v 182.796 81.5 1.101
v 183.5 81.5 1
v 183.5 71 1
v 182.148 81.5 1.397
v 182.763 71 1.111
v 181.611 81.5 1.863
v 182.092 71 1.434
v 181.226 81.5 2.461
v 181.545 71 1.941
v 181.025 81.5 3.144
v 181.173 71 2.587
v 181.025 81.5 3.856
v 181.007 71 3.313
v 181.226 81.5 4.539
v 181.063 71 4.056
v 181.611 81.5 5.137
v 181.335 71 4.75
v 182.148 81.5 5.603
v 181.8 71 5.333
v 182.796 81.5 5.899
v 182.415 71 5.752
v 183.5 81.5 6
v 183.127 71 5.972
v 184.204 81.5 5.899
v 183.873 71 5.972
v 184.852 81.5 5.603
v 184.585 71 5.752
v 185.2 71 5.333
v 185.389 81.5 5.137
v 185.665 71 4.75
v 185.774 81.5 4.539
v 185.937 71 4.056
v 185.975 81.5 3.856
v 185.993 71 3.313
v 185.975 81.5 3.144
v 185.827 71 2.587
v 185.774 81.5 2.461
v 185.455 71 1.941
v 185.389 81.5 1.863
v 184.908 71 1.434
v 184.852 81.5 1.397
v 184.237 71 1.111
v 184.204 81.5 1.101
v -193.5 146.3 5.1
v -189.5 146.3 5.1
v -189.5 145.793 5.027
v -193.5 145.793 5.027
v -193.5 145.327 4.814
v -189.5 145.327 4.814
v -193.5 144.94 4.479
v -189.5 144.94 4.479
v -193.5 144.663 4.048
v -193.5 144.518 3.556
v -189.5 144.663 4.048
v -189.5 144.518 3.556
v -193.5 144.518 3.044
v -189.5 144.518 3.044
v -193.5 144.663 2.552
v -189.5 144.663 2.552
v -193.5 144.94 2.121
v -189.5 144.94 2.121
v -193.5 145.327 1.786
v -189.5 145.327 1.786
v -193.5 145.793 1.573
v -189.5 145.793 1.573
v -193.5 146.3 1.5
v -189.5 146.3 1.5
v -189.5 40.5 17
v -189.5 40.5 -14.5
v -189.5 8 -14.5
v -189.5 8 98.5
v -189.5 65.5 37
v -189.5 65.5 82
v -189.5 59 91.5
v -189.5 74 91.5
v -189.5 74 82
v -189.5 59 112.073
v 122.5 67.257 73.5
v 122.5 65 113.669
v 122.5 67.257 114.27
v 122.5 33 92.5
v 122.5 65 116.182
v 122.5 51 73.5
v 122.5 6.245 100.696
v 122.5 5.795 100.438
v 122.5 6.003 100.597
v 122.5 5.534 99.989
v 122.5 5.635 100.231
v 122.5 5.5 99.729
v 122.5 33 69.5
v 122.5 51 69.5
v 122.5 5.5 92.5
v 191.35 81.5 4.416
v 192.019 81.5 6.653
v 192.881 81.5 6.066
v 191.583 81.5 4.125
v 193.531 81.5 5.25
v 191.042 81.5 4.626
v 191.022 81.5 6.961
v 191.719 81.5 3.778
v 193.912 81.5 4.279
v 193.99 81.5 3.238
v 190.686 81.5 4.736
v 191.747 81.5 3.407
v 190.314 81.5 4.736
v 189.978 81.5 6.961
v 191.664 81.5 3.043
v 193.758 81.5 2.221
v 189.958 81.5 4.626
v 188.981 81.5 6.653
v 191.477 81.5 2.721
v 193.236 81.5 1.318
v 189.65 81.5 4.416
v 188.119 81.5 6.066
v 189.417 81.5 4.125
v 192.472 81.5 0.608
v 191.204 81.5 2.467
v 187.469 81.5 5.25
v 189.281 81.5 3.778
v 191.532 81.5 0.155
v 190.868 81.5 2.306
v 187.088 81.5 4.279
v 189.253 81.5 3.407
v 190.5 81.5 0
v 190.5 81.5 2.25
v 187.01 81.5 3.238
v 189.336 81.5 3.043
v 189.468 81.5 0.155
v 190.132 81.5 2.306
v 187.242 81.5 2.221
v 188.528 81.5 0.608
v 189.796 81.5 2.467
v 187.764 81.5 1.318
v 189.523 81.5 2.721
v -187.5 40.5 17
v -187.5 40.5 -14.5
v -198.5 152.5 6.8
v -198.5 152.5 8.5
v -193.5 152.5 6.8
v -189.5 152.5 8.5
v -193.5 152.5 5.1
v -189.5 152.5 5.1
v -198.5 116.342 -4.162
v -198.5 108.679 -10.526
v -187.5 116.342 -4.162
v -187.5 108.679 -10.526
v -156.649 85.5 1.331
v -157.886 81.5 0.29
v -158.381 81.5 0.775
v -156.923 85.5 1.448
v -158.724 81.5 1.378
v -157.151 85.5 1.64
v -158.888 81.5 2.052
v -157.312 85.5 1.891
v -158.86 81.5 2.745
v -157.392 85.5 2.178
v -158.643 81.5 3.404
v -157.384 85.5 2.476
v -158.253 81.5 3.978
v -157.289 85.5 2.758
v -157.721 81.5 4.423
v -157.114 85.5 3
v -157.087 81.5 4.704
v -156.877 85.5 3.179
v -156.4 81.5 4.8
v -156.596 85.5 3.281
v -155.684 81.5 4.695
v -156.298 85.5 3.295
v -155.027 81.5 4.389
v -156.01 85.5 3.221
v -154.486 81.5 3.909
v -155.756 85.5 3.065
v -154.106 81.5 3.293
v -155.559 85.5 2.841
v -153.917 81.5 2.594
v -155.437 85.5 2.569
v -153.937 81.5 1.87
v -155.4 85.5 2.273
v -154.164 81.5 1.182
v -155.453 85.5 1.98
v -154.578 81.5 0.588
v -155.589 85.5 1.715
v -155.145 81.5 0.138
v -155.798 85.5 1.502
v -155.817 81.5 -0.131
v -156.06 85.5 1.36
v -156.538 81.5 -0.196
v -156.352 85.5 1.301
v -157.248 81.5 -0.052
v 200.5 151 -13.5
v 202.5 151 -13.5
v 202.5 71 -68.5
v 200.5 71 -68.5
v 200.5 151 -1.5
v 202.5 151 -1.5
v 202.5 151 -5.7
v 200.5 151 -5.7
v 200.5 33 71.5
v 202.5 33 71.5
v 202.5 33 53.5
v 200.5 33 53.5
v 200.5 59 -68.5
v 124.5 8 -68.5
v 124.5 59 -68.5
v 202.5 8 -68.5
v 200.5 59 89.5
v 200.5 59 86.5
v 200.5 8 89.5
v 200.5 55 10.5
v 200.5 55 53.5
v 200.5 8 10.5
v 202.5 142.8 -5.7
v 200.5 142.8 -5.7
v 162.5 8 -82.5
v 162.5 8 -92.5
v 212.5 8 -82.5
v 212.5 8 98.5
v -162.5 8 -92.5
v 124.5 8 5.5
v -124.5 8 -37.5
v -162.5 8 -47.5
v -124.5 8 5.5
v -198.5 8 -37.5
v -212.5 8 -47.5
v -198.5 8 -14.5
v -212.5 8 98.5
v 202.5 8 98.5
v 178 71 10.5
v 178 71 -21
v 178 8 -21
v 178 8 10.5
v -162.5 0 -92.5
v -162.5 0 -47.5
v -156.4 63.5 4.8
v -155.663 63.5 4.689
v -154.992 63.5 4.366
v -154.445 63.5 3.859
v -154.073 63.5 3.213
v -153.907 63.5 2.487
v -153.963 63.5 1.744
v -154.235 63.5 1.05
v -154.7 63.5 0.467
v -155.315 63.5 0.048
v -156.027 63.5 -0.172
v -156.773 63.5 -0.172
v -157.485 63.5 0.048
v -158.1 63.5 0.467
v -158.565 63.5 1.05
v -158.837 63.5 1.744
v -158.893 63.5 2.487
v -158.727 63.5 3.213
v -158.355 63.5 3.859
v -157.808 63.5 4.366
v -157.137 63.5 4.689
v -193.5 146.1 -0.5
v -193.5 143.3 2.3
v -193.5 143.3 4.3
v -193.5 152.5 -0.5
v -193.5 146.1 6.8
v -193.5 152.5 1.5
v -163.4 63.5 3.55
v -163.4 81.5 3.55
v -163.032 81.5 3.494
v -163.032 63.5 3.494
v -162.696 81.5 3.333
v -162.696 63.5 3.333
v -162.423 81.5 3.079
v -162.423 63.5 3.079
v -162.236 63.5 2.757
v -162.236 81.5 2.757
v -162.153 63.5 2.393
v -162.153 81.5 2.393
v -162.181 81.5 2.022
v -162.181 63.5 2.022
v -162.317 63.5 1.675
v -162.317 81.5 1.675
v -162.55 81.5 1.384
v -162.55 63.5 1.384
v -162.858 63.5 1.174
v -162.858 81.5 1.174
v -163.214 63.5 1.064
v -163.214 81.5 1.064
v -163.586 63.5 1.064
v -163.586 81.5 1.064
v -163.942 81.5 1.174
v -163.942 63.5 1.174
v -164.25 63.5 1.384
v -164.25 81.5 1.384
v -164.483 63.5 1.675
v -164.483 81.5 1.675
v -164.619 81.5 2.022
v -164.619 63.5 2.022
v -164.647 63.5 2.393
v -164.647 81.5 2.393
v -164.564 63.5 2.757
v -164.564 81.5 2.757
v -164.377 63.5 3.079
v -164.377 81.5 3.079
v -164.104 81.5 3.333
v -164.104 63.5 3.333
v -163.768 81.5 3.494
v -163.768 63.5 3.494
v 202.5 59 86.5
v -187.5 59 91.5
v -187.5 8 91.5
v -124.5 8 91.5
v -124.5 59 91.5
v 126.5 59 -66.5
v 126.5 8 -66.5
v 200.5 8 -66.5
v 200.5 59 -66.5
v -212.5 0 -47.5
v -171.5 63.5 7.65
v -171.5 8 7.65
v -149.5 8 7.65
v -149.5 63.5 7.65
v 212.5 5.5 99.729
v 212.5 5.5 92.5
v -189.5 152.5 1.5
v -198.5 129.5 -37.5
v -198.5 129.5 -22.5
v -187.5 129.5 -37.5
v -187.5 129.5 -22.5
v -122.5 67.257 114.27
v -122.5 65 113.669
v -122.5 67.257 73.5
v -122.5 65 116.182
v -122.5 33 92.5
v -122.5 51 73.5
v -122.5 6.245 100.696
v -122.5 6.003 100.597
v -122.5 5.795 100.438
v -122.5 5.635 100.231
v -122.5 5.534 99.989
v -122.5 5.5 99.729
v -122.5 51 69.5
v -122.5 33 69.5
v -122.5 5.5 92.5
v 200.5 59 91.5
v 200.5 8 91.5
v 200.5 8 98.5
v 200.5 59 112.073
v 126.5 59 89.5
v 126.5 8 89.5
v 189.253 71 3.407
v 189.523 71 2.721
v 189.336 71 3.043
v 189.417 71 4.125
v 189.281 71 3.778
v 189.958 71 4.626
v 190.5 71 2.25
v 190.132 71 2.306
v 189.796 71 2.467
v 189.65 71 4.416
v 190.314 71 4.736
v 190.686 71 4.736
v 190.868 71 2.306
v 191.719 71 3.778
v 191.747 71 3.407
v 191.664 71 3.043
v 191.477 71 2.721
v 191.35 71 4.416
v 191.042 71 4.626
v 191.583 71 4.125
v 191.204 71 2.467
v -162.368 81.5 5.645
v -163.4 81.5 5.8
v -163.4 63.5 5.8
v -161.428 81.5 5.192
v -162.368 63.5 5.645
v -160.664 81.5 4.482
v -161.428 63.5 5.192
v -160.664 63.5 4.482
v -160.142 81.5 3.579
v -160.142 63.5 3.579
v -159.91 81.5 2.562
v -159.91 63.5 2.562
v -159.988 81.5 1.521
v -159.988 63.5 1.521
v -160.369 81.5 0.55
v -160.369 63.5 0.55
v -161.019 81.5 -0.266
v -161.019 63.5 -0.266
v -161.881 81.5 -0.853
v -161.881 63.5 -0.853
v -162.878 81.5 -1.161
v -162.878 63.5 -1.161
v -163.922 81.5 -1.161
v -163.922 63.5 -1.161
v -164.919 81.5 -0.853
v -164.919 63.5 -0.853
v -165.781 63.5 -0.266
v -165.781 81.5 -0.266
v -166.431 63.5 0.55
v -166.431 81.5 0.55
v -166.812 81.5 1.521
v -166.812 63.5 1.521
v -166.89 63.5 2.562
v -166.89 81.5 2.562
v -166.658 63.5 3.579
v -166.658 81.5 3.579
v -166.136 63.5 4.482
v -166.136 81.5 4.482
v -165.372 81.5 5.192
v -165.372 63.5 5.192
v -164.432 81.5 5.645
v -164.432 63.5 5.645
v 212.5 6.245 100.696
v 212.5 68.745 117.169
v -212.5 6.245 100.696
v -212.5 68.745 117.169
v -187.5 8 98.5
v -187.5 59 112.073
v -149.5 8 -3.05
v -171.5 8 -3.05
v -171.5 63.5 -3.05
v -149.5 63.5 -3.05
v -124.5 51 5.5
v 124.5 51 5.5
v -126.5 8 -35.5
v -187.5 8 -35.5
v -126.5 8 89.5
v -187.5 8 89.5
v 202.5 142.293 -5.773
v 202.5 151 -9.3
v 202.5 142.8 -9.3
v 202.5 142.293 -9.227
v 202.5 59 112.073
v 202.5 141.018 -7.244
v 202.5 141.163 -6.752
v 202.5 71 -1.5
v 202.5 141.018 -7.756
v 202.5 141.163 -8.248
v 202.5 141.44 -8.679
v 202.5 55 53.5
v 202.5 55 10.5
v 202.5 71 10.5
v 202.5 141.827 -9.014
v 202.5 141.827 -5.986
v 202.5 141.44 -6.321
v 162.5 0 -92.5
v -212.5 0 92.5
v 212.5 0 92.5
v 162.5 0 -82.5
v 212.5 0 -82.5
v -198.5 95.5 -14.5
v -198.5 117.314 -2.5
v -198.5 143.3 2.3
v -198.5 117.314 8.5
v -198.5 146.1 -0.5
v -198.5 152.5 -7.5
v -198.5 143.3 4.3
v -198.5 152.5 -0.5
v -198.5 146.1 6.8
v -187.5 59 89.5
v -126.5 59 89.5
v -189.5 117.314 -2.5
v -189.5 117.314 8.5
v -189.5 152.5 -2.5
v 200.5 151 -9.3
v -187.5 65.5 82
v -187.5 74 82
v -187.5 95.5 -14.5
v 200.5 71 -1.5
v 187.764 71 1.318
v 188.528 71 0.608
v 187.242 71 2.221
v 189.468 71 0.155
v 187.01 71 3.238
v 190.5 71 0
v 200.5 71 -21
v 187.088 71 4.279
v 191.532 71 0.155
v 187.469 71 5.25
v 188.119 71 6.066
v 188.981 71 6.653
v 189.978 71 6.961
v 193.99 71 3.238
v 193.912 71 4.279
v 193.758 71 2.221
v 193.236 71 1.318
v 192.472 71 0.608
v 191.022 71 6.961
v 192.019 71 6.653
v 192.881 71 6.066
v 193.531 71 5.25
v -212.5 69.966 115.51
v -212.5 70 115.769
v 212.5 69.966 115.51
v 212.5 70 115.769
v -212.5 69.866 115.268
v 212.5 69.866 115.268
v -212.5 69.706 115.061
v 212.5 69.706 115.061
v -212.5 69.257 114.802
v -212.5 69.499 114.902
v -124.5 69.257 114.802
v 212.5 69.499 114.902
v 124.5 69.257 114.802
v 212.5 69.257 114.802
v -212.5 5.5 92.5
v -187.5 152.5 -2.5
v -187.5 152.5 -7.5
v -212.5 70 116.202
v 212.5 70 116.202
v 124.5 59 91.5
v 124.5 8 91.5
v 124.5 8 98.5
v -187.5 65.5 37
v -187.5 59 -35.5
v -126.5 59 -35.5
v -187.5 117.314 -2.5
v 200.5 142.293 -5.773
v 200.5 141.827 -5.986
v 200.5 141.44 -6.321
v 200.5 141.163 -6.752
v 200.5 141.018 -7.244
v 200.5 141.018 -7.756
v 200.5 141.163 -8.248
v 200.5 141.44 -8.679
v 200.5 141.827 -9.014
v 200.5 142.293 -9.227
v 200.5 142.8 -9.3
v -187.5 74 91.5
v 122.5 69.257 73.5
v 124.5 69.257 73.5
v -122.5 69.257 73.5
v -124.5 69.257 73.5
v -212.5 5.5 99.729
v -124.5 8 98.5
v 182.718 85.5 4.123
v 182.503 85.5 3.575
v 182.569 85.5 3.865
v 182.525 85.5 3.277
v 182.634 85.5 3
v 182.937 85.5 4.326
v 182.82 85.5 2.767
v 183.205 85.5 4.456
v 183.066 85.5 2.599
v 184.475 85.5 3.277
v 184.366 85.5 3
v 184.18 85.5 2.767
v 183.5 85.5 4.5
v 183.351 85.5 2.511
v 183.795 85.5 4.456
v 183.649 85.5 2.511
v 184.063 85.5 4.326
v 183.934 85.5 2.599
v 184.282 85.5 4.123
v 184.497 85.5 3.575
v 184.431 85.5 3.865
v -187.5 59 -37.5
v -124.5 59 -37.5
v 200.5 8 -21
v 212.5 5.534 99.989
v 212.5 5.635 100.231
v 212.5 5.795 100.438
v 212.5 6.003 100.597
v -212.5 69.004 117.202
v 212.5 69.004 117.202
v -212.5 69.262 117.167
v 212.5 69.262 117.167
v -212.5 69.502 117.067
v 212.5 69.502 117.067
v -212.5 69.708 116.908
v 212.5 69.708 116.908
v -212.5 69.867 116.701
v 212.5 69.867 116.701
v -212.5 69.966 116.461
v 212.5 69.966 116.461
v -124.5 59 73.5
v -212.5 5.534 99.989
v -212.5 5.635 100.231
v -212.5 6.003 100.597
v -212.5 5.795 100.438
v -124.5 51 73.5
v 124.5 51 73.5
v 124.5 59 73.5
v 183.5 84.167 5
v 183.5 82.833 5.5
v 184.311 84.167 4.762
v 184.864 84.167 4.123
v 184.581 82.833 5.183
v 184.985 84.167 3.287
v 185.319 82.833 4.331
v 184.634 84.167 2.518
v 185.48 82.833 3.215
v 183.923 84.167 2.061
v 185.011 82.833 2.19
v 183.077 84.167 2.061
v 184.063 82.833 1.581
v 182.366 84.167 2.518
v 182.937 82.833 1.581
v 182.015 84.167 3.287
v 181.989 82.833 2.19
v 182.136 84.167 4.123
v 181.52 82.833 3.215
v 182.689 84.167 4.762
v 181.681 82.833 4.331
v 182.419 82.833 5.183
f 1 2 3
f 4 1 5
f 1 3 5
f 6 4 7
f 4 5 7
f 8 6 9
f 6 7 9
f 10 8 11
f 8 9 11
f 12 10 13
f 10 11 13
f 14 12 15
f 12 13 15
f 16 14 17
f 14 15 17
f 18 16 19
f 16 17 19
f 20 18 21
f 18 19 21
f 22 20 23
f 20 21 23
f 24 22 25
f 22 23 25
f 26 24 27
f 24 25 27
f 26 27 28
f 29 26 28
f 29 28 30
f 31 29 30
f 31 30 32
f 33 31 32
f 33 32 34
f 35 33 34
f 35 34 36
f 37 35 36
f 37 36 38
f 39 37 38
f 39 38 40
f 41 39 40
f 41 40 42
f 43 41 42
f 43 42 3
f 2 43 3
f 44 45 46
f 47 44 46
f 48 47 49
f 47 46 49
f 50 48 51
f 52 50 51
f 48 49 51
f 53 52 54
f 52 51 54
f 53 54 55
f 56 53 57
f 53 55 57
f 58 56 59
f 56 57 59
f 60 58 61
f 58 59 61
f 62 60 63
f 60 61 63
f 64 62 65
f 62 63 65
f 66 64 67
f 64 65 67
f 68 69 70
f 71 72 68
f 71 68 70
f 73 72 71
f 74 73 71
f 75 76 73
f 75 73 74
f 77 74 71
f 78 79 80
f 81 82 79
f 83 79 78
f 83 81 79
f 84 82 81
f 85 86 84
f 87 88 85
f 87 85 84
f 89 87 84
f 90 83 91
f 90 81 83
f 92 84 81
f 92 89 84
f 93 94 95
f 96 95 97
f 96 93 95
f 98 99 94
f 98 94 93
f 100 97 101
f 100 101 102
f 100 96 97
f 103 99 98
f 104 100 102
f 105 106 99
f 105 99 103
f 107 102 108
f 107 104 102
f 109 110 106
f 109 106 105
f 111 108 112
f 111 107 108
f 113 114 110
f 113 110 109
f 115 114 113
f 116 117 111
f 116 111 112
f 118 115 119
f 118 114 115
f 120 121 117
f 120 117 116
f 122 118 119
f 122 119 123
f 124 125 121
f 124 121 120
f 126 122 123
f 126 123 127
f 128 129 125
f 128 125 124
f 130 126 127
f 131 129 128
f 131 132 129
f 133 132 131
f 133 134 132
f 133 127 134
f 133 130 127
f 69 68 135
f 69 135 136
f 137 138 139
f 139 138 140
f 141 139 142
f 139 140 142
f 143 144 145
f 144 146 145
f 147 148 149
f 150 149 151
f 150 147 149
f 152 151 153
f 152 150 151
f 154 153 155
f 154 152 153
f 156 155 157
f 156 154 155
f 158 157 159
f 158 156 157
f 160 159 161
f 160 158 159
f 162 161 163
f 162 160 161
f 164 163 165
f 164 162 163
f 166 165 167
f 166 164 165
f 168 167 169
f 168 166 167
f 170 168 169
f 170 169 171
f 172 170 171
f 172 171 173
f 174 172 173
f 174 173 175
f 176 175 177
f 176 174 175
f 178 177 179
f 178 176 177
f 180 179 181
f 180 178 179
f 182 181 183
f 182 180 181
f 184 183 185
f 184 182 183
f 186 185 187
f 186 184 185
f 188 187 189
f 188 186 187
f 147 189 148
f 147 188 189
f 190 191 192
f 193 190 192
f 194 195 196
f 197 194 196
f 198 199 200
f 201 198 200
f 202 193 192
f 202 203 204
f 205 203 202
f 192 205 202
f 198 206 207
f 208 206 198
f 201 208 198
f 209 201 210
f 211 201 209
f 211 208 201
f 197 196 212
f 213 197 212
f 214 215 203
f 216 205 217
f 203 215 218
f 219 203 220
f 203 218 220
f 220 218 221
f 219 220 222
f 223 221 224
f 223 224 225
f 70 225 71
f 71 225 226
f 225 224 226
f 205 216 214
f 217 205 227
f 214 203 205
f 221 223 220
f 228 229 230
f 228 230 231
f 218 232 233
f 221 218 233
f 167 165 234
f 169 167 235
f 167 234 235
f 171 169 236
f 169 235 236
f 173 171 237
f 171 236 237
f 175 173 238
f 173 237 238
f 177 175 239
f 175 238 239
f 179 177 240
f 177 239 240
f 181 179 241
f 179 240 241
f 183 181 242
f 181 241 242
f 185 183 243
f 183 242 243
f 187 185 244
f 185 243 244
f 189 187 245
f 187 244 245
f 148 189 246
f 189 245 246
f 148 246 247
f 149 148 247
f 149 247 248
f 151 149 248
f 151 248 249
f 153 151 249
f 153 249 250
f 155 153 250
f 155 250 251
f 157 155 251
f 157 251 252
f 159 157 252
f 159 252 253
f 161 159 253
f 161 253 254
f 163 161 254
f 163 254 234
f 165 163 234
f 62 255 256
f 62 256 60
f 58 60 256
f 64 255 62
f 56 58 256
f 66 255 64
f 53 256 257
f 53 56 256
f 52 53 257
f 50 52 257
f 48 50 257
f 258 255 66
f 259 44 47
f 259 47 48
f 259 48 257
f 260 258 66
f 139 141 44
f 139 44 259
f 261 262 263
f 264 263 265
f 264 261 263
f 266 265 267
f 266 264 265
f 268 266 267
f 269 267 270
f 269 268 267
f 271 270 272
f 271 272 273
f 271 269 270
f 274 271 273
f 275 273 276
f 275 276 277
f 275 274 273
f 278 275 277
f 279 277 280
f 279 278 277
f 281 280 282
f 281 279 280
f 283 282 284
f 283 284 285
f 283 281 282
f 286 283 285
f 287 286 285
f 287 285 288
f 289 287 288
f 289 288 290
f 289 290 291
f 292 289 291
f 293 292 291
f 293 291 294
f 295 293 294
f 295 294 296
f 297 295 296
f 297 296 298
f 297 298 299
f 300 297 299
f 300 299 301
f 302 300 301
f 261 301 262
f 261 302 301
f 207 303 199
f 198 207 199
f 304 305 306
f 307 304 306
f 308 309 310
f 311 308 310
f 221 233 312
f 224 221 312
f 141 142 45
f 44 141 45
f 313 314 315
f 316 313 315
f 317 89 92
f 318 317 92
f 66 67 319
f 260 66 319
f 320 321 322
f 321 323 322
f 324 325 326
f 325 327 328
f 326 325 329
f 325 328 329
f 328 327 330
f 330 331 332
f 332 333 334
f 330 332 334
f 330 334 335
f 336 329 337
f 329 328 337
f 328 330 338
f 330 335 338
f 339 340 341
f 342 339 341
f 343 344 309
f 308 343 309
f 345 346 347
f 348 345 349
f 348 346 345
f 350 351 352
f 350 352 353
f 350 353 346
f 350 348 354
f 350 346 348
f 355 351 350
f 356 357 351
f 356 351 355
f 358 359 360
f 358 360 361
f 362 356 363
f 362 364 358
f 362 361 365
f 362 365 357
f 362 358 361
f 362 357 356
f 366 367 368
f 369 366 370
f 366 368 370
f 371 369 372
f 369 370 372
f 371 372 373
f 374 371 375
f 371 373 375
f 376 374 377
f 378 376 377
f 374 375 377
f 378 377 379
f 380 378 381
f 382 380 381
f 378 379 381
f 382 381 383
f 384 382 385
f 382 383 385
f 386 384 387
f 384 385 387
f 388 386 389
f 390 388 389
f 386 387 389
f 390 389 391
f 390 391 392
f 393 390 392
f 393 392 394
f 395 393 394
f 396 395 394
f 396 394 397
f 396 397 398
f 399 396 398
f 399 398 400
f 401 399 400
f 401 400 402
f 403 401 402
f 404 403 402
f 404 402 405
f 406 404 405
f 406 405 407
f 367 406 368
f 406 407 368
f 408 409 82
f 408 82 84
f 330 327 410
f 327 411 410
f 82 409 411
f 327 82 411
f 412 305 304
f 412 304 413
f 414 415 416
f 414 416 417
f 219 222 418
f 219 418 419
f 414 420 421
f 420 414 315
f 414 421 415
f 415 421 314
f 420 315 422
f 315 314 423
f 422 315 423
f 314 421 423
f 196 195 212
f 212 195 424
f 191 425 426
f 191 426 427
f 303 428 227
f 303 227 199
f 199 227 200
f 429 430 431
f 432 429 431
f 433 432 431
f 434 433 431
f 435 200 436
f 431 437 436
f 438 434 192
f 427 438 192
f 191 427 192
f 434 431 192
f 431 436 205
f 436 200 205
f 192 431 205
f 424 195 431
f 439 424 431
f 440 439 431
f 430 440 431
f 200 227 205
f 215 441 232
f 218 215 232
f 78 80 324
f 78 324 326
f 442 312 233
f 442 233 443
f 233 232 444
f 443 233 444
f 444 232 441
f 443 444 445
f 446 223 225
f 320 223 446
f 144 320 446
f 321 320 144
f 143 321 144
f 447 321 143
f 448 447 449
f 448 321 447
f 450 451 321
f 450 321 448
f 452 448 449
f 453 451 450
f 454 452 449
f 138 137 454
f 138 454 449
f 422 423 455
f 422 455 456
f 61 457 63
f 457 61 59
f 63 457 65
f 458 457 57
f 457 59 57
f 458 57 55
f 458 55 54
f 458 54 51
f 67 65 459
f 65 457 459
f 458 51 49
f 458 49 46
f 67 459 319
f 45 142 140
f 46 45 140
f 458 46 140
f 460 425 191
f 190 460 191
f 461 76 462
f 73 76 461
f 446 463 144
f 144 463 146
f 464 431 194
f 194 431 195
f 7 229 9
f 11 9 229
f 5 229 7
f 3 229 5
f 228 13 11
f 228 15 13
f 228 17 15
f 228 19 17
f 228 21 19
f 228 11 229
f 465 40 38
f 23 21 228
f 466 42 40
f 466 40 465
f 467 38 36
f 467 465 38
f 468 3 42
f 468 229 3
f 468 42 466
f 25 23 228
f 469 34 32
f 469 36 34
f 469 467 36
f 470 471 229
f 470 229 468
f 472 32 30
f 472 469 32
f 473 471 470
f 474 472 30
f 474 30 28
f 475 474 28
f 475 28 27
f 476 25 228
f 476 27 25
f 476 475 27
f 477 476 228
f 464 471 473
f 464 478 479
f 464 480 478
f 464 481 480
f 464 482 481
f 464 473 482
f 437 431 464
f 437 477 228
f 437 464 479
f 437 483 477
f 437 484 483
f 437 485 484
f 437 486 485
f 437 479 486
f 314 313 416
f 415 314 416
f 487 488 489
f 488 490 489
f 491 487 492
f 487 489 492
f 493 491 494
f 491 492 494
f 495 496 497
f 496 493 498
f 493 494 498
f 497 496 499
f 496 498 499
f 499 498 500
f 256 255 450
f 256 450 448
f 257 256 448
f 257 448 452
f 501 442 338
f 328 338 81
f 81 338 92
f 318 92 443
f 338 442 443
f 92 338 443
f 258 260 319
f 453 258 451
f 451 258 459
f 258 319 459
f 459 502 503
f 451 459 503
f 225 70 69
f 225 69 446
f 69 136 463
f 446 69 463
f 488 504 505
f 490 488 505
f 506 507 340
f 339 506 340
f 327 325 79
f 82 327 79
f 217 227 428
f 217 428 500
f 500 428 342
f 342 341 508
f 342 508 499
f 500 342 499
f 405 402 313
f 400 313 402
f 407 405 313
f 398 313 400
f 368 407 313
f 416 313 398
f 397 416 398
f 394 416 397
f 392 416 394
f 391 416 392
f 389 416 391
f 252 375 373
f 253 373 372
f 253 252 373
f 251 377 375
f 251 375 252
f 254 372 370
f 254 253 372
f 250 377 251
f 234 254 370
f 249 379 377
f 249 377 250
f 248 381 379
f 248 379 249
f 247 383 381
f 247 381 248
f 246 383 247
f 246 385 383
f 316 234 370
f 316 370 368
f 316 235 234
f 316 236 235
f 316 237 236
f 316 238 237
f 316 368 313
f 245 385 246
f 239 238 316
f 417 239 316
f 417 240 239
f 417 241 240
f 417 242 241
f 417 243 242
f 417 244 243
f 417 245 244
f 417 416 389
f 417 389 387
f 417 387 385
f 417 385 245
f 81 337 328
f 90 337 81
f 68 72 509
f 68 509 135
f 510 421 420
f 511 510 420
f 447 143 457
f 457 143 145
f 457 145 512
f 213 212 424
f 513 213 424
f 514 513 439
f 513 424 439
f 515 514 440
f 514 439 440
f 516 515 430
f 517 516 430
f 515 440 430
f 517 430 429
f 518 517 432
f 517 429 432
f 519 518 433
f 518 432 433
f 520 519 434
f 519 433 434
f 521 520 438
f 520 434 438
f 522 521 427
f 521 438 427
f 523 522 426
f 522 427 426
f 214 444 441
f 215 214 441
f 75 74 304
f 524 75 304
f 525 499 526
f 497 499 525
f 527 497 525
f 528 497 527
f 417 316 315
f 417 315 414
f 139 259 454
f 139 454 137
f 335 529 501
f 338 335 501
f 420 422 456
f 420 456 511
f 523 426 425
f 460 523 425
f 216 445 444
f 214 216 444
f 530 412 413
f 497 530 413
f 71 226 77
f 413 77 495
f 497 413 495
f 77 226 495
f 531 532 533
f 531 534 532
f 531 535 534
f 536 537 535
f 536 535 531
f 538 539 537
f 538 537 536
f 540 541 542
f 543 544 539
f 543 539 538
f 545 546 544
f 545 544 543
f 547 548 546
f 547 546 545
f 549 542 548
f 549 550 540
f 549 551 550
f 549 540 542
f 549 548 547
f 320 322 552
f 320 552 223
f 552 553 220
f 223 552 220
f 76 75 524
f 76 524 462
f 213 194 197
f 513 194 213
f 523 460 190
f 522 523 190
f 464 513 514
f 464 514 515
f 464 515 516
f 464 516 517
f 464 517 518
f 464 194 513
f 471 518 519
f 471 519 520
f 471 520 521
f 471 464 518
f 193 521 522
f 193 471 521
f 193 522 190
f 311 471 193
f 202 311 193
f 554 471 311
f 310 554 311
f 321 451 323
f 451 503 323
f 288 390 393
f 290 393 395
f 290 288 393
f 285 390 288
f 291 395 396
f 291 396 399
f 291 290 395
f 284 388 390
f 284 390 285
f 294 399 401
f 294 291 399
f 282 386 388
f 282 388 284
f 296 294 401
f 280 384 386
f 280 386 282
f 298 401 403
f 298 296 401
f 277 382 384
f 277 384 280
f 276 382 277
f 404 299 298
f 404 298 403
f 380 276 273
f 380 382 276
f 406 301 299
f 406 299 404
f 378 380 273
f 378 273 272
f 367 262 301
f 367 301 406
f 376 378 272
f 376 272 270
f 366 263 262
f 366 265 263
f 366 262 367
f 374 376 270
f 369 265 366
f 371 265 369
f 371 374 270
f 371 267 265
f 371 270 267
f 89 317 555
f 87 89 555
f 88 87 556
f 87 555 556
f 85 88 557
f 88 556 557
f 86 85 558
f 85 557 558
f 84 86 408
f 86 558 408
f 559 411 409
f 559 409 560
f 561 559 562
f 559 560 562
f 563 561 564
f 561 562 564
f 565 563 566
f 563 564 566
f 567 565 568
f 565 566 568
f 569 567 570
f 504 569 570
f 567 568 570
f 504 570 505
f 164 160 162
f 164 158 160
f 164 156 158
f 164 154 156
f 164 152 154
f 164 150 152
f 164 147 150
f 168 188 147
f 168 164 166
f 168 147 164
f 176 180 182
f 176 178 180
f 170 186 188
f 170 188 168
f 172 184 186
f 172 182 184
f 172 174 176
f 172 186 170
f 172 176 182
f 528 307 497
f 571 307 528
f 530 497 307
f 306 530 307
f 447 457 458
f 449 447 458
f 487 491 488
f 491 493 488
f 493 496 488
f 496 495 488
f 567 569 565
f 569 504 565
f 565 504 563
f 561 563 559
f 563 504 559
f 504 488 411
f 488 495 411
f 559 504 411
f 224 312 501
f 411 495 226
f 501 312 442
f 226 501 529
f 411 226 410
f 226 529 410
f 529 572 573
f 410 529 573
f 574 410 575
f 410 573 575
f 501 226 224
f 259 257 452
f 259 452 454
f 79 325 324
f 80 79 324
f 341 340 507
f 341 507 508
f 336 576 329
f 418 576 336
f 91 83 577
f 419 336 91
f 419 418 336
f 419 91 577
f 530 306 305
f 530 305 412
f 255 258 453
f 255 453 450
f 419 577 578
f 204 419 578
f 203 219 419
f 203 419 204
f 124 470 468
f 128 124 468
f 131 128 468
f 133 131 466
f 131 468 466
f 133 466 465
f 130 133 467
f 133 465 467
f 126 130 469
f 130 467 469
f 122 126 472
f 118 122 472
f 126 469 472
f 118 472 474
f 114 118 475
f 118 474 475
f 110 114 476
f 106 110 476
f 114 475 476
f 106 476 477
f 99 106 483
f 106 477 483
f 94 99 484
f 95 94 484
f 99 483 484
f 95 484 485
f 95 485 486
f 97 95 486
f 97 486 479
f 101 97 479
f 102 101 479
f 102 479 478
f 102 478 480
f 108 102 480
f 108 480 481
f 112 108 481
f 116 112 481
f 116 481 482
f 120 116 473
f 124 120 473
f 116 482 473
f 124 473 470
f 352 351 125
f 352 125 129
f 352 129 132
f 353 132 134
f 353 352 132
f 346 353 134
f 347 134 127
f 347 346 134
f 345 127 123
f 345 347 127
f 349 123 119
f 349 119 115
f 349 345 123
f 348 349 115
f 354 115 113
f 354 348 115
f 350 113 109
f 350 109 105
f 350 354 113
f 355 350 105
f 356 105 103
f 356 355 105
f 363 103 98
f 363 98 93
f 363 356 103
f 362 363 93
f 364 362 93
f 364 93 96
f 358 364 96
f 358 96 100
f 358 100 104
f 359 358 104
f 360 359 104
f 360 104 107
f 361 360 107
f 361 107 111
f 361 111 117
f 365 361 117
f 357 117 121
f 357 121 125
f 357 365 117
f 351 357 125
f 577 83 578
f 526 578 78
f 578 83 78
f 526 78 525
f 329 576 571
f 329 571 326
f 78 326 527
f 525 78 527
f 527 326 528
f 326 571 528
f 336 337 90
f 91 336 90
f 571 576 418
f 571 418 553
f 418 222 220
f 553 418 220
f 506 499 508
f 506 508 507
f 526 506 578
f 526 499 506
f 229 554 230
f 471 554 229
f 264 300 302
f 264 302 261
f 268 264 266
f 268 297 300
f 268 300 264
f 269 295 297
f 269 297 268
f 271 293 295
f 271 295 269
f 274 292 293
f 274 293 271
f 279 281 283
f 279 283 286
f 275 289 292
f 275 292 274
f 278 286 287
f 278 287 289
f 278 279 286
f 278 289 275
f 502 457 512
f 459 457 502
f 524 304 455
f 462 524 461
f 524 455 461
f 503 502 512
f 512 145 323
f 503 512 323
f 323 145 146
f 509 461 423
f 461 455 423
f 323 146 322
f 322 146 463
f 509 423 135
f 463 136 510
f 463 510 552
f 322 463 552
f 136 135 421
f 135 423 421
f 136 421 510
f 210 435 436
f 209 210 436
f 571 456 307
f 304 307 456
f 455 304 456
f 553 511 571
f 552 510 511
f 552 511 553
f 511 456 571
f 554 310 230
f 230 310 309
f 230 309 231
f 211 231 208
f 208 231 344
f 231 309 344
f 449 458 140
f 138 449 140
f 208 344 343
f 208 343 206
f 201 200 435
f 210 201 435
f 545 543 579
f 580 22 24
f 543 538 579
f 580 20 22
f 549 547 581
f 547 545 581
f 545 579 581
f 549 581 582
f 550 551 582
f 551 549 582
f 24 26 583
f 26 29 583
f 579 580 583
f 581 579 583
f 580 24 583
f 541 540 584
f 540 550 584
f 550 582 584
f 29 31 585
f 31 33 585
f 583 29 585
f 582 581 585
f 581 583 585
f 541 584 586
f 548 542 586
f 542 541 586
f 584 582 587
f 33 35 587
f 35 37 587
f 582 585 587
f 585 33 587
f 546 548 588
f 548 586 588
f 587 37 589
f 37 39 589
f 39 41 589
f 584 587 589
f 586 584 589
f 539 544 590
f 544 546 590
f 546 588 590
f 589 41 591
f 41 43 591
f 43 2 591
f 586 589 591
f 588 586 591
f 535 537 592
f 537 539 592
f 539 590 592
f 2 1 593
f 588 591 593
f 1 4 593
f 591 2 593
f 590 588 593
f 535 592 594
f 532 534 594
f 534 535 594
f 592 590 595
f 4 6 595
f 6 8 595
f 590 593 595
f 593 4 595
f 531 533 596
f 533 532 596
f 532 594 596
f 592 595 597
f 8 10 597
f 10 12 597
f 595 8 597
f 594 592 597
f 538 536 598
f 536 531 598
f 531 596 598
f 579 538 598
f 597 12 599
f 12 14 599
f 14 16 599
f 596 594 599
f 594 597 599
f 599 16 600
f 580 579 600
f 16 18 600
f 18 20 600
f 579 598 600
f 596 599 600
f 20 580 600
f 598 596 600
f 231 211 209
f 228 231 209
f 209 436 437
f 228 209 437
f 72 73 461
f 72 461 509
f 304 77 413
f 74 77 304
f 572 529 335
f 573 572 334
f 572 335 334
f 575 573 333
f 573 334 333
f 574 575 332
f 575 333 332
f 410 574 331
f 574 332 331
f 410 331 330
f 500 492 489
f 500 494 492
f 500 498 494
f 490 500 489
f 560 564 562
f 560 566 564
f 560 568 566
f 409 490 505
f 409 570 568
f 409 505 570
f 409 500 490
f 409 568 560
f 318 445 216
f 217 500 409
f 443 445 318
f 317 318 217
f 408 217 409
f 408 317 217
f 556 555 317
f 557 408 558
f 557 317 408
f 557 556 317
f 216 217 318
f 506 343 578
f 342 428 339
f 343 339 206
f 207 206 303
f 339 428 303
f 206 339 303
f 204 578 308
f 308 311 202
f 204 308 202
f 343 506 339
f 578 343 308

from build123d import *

# Parameters (mm, degrees)
SALIENTE_EXTRUIR3_DEPTH     = 8
CROQUIS4_W                  = 425
CROQUIS4_H                  = 25
SALIENTE_EXTRUIR5_DEPTH     = 70
CORTAR_EXTRUIR5_DEPTH       = 447.465284205
REDONDEO2_R                 = 1
CROQUIS7_W                  = 245
CROQUIS7_H                  = 65
CORTAR_EXTRUIR6_DEPTH       = 25
CROQUIS8_W                  = 245
CROQUIS8_H                  = 23
SALIENTE_EXTRUIR6_DEPTH     = 25
SALIENTE_EXTRUIR7_DEPTH     = 2
SALIENTE_EXTRUIR8_DEPTH     = 2
CROQUIS13_W                 = 41.302313383
CROQUIS13_H                 = 2
SALIENTE_EXTRUIR13_DEPTH    = 245
CROQUIS15_W                 = 78
CROQUIS15_H                 = 160
CROQUIS15_W_2               = 74
CROQUIS15_H_2               = 156
SALIENTE_EXTRUIR15_DEPTH    = 51
CROQUIS16_W                 = 245
CROQUIS16_H                 = 64
SALIENTE_EXTRUIR16_DEPTH    = 43
CROQUIS17_W                 = 2
CROQUIS17_H                 = 68
SALIENTE_EXTRUIR18_DEPTH    = 43
SALIENTE_EXTRUIR21_DEPTH    = 2
CROQUIS20_W                 = 2
CROQUIS20_H                 = 160
SALIENTE_EXTRUIR22_DEPTH    = 100
CORTAR_EXTRUIR7_DEPTH       = 2
CROQUIS22_W                 = 2
CROQUIS22_H                 = 68
SALIENTE_EXTRUIR23_DEPTH    = 43
CROQUIS23_W                 = 65
CROQUIS23_H                 = 129
CROQUIS23_W_2               = 61
CROQUIS23_H_2               = 125
SALIENTE_EXTRUIR24_DEPTH    = 51
SALIENTE_EXTRUIR26_DEPTH    = 2
CROQUIS27_W                 = 2
CROQUIS27_H                 = 129
SALIENTE_EXTRUIR27_DEPTH    = 150
CORTAR_EXTRUIR9_DEPTH       = 2
SALIENTE_EXTRUIR28_DEPTH    = 9
CORTAR_EXTRUIR10_DEPTH      = 1
CORTAR_EXTRUIR10_DEPTH_BACK = 5
CROQUIS33_W                 = 22
CROQUIS33_H                 = 10.7
SALIENTE_EXTRUIR29_DEPTH    = 55.5
CROQUIS34_R                 = 3.5
CROQUIS34_R_2               = 1.25
CROQUIS34_R_3               = 2.5
SALIENTE_EXTRUIR30_DEPTH    = 18
CROQUIS36_W                 = 31.5
CROQUIS36_H                 = 63
SALIENTE_EXTRUIR34_DEPTH    = 22.5
CROQUIS37_R                 = 3.5
CROQUIS37_R_2               = 1.25
CROQUIS37_R_3               = 2.5
SALIENTE_EXTRUIR35_DEPTH    = 10.5
CROQUIS38_R                 = 1
SALIENTE_EXTRUIR36_DEPTH    = 4
CROQUIS39_R                 = 1
SALIENTE_EXTRUIR37_DEPTH    = 4


with BuildPart() as part:
    # Croquis1 → Saliente-Extruir3 (new body)
    with BuildSketch(Plane(origin=(0, 0, 0), x_dir=(1, 0, 0), z_dir=(0, 1, 0))):
        Polygon((-212.5, -92.5), (212.5, -92.5), (212.5, 82.5), (162.5, 82.5), (162.5, 92.5), (-162.5, 92.5), (-162.5, 47.5), (-212.5, 47.5), align=None)
    extrude(amount=SALIENTE_EXTRUIR3_DEPTH)



with BuildPart() as body_2:
    # Croquis4 → Saliente-Extruir5 (new body)
    with BuildSketch(Plane.XZ):
        with Locations((0, 105)):
            Rectangle(CROQUIS4_W, CROQUIS4_H)
    extrude(amount=-SALIENTE_EXTRUIR5_DEPTH)

    # Croquis5 → Cortar-Extruir5 (cut, through all)
    with BuildSketch(Plane.ZY.offset(212.5)):
        Polygon((92.5, 70), (92.5, 8), (98.5, 8), (115, 70), align=None)
        Polygon((100.5, 5.5), (92.5, 5.5), (92.5, 0), (117.5, 0), (117.5, 70), align=None)
    extrude(amount=-CORTAR_EXTRUIR5_DEPTH, mode=Mode.SUBTRACT)

    # Redondeo2
    redondeo2_edges = [body_2.edges().sort_by_distance(p)[0] for p in [
        (0, 70, 117.5),
        (0, 5.5, 100.5),
        (0, 70, 115),
    ]]
    fillet(redondeo2_edges, radius=REDONDEO2_R)

    # Croquis7 → Cortar-Extruir6 (cut)
    with BuildSketch(Plane.XY.offset(92.5)):
        with Locations((0, 32.5)):
            Rectangle(CROQUIS7_W, CROQUIS7_H)
    extrude(amount=CORTAR_EXTRUIR6_DEPTH, mode=Mode.SUBTRACT)


with BuildPart() as part_1:
    add(part.part)

    add(body_2.part)  # Saliente-Extruir6 merges body 2
    # Croquis8 → Saliente-Extruir6 (add)
    with BuildSketch(Plane(origin=(0, 8, 0), x_dir=(1, 0, 0), z_dir=(0, 1, 0))):
        with Locations((0, -81)):
            Rectangle(CROQUIS8_W, CROQUIS8_H)
    extrude(amount=SALIENTE_EXTRUIR6_DEPTH)

    # Croquis9 → Saliente-Extruir7 (add)
    with BuildSketch(Plane.ZY.offset(122.5)):
        Polygon((114.802313383, 69.25717756), (98.5, 8), (73.5, 8), (73.5, 69.25717756), align=None)
    extrude(amount=SALIENTE_EXTRUIR7_DEPTH)

    # Croquis10 → Saliente-Extruir8 (add)
    with BuildSketch(Plane(origin=(122.5, 0, 0), x_dir=(0, 0, -1), z_dir=(1, 0, 0))):
        Polygon((-114.802313383, 69.25717756), (-98.5, 8), (-73.5, 8), (-73.5, 69.25717756), align=None)
    extrude(amount=SALIENTE_EXTRUIR8_DEPTH)

    # Croquis13 → Saliente-Extruir13 (add)
    with BuildSketch(Plane(origin=(-122.5, 0, 0), x_dir=(0, 0, -1), z_dir=(1, 0, 0))):
        with Locations((-94.151156692, 68.25717756)):
            Rectangle(CROQUIS13_W, CROQUIS13_H)
    extrude(amount=SALIENTE_EXTRUIR13_DEPTH)

    # Croquis15 → Saliente-Extruir15 (add)
    with BuildSketch(Plane(origin=(0, 8, 0), x_dir=(1, 0, 0), z_dir=(0, 1, 0))):
        with Locations((163.5, -11.5)):
            Rectangle(CROQUIS15_W, CROQUIS15_H)
        with Locations((163.5, -11.5)):
            Rectangle(CROQUIS15_W_2, CROQUIS15_H_2, mode=Mode.SUBTRACT)
    extrude(amount=SALIENTE_EXTRUIR15_DEPTH)

    # Croquis16 → Saliente-Extruir16 (add)
    with BuildSketch(Plane(origin=(0, 8, 0), x_dir=(1, 0, 0), z_dir=(0, 1, 0))):
        with Locations((0, -37.5)):
            Rectangle(CROQUIS16_W, CROQUIS16_H)
    extrude(amount=SALIENTE_EXTRUIR16_DEPTH)

    # Croquis17 → Saliente-Extruir18 (add)
    with BuildSketch(Plane(origin=(0, 8, 0), x_dir=(1, 0, 0), z_dir=(0, 1, 0))):
        with Locations((123.5, -39.5)):
            Rectangle(CROQUIS17_W, CROQUIS17_H)
    extrude(amount=SALIENTE_EXTRUIR18_DEPTH)

    # Croquis18 → Saliente-Extruir21 (add)
    with BuildSketch(Plane(origin=(202.5, 0, 0), x_dir=(0, 0, -1), z_dir=(1, 0, 0))):
        Polygon((-91.5, 8), (-98.5, 8), (-112.072580645, 59), (-91.5, 59), align=None)
    extrude(amount=-SALIENTE_EXTRUIR21_DEPTH)

    # Croquis20 → Saliente-Extruir22 (add)
    with BuildSketch(Plane(origin=(0, 59, 0), x_dir=(1, 0, 0), z_dir=(0, 1, 0))):
        with Locations((201.5, -11.5)):
            Rectangle(CROQUIS20_W, CROQUIS20_H)
    extrude(amount=SALIENTE_EXTRUIR22_DEPTH)

    # Croquis21 → Cortar-Extruir7 (cut)
    with BuildSketch(Plane(origin=(202.5, 0, 0), x_dir=(0, 0, -1), z_dir=(1, 0, 0))):
        with BuildLine():
            Line((-91.5, 59), (-86.5, 59))
            Line((-86.5, 59), (-71.5, 33))
            Line((-71.5, 33), (-53.5, 33))
            Line((-53.5, 33), (-53.5, 55))
            Line((-53.5, 55), (-10.5, 55))
            Line((-10.5, 55), (-10.5, 71))
            Line((-10.5, 71), (1.5, 71))
            Line((1.5, 71), (1.5, 151))
            Line((1.5, 151), (5.7, 151))
            Line((5.7, 151), (5.7, 142.8))
            ThreePointArc((5.7, 142.8), (7.5, 141), (9.3, 142.8))
            Line((9.3, 142.8), (9.3, 151))
            Line((9.3, 151), (13.5, 151))
            Line((13.5, 151), (68.5, 71))
            Line((68.5, 71), (68.5, 159))
            Line((68.5, 159), (-91.5, 159))
            Line((-91.5, 159), (-91.5, 59))
        make_face()
    extrude(amount=-CORTAR_EXTRUIR7_DEPTH, mode=Mode.SUBTRACT)

    # Croquis22 → Saliente-Extruir23 (add)
    with BuildSketch(Plane(origin=(0, 8, 0), x_dir=(1, 0, 0), z_dir=(0, 1, 0))):
        with Locations((-123.5, -39.5)):
            Rectangle(CROQUIS22_W, CROQUIS22_H)
    extrude(amount=SALIENTE_EXTRUIR23_DEPTH)

    # Croquis23 → Saliente-Extruir24 (add)
    with BuildSketch(Plane(origin=(0, 8, 0), x_dir=(1, 0, 0), z_dir=(0, 1, 0))):
        with Locations((-157, -27)):
            Rectangle(CROQUIS23_W, CROQUIS23_H)
        with Locations((-157, -27)):
            Rectangle(CROQUIS23_W_2, CROQUIS23_H_2, mode=Mode.SUBTRACT)
    extrude(amount=SALIENTE_EXTRUIR24_DEPTH)

    # Croquis26 → Saliente-Extruir26 (add)
    with BuildSketch(Plane.ZY.offset(189.5)):
        Polygon((91.5, 8), (98.5, 8), (112.072580645, 59), (91.5, 59), align=None)
    extrude(amount=-SALIENTE_EXTRUIR26_DEPTH)

    # Croquis27 → Saliente-Extruir27 (add)
    with BuildSketch(Plane(origin=(0, 51, 0), x_dir=(1, 0, 0), z_dir=(0, 1, 0))):
        with Locations((-188.5, -27)):
            Rectangle(CROQUIS27_W, CROQUIS27_H)
    extrude(amount=SALIENTE_EXTRUIR27_DEPTH)

    # Croquis28 → Cortar-Extruir9 (cut)
    with BuildSketch(Plane.ZY.offset(189.5)):
        Polygon((91.5, 74), (82, 74), (82, 65.5), (37, 65.5), (17, 40.5), (-14.5, 40.5), (-14.5, 95.5), (-10.526321509, 108.678894785), (-4.162244055, 116.341763556), (-2.5, 117.313768237), (-2.5, 152.5), (-7.5, 152.5), (-22.5, 129.5), (-37.5, 129.5), (-37.5, 201), (91.5, 201), align=None)
    extrude(amount=-CORTAR_EXTRUIR9_DEPTH, mode=Mode.SUBTRACT)

    # Croquis29 → Saliente-Extruir28 (add)
    with BuildSketch(Plane.ZY.offset(189.5)):
        with BuildLine():
            Line((-14.5, 95.5), (-10.526321509, 108.678894785))
            Line((-10.526321509, 108.678894785), (-4.162244055, 116.341763556))
            Line((-4.162244055, 116.341763556), (-2.5, 117.313768237))
            Line((-2.5, 117.313768237), (8.5, 117.313768237))
            Line((8.5, 117.313768237), (8.5, 152.5))
            Line((8.5, 152.5), (5.1, 152.5))
            Line((5.1, 152.5), (5.1, 146.3))
            ThreePointArc((5.1, 146.3), (3.3, 144.5), (1.5, 146.3))
            Line((1.5, 146.3), (1.5, 152.5))
            Line((1.5, 152.5), (-7.5, 152.5))
            Line((-7.5, 152.5), (-22.5, 129.5))
            Line((-22.5, 129.5), (-37.5, 129.5))
            Line((-37.5, 129.5), (-37.5, 8))
            Line((-37.5, 8), (-14.5, 8))
            Line((-14.5, 8), (-14.5, 95.5))
        make_face()
    extrude(amount=SALIENTE_EXTRUIR28_DEPTH)

    # Croquis30 → Cortar-Extruir10 (cut, two sides: drawn at the far end of the back side and taken through both)
    with BuildSketch(Plane.ZY.offset(198.5).offset(-CORTAR_EXTRUIR10_DEPTH_BACK)):
        with BuildLine():
            Line((1.5, 152.5), (-0.5, 152.5))
            Line((-0.5, 152.5), (-0.5, 146.1))
            Line((-0.5, 146.1), (2.3, 143.3))
            Line((2.3, 143.3), (4.3, 143.3))
            Line((4.3, 143.3), (6.8, 146.1))
            Line((6.8, 146.1), (6.8, 152.5))
            Line((6.8, 152.5), (5.1, 152.5))
            Line((5.1, 152.5), (5.1, 146.3))
            ThreePointArc((5.1, 146.3), (3.3, 144.5), (1.5, 146.3))
            Line((1.5, 146.3), (1.5, 152.5))
        make_face()
    extrude(amount=CORTAR_EXTRUIR10_DEPTH + CORTAR_EXTRUIR10_DEPTH_BACK, mode=Mode.SUBTRACT)

    # Croquis33 → Saliente-Extruir29 (add)
    with BuildSketch(Plane(origin=(0, 8, 0), x_dir=(1, 0, 0), z_dir=(0, 1, 0))):
        with Locations((-160.5, -2.3)):
            Rectangle(CROQUIS33_W, CROQUIS33_H)
    extrude(amount=SALIENTE_EXTRUIR29_DEPTH)

    # Croquis34 → Saliente-Extruir30 (add)
    # profile 1 of 2: a face of its own
    with BuildSketch(Plane(origin=(0, 63.5, 0), x_dir=(1, 0, 0), z_dir=(0, 1, 0))):
        with Locations(Location((-163.4, -2.3, 0), (0, 0, 270))):
            Circle(CROQUIS34_R)
        with Locations(Location((-163.4, -2.3, 0), (0, 0, 270))):
            Circle(CROQUIS34_R_2, mode=Mode.SUBTRACT)
    # profile 2 of 2: a face of its own
    with BuildSketch(Plane(origin=(0, 63.5, 0), x_dir=(1, 0, 0), z_dir=(0, 1, 0))):
        with Locations(Location((-156.4, -2.3, 0), (0, 0, 270))):
            Circle(CROQUIS34_R_3)
    extrude(amount=SALIENTE_EXTRUIR30_DEPTH)

    # Croquis36 → Saliente-Extruir34 (add)
    with BuildSketch(Plane.ZY.offset(-200.5)):
        with Locations((-5.25, 39.5)):
            Rectangle(CROQUIS36_W, CROQUIS36_H)
    extrude(amount=SALIENTE_EXTRUIR34_DEPTH)

    # Croquis37 → Saliente-Extruir35 (add)
    # profile 1 of 2: a face of its own
    with BuildSketch(Plane(origin=(0, 71, 0), x_dir=(1, 0, 0), z_dir=(0, 1, 0))):
        with Locations(Location((190.5, -3.5, 0), (0, 0, 90))):
            Circle(CROQUIS37_R)
        with Locations(Location((190.5, -3.5, 0), (0, 0, 90))):
            Circle(CROQUIS37_R_2, mode=Mode.SUBTRACT)
    # profile 2 of 2: a face of its own
    with BuildSketch(Plane(origin=(0, 71, 0), x_dir=(1, 0, 0), z_dir=(0, 1, 0))):
        with Locations(Location((183.5, -3.5, 0), (0, 0, 90))):
            Circle(CROQUIS37_R_3)
    extrude(amount=SALIENTE_EXTRUIR35_DEPTH)

    # Croquis38 → Saliente-Extruir36 (add)
    with BuildSketch(Plane(origin=(0, 81.5, 0), x_dir=(1, 0, 0), z_dir=(0, 1, 0))):
        with Locations(Location((183.5, -3.5, 0), (0, 0, 270))):
            Circle(CROQUIS38_R)
    extrude(amount=SALIENTE_EXTRUIR36_DEPTH)

    # loft up to a face of the part (recubrir2)
    loft([Face(Wire([part_1.edges().sort_by_distance((184.228968627, 85.5, 2.815452894))[0]])), Face(Wire([part_1.edges().sort_by_distance((181.677578431, 81.5, 5.211367765))[0]]))])

    # Croquis39 → Saliente-Extruir37 (add)
    with BuildSketch(Plane(origin=(0, 81.5, 0), x_dir=(1, 0, 0), z_dir=(0, 1, 0))):
        with Locations(Location((-156.4, -2.3, 0), (0, 0, 270))):
            Circle(CROQUIS39_R)
    extrude(amount=SALIENTE_EXTRUIR37_DEPTH)

    # Recubrir3: read off the stored shape, not the designer's step
    # Recubrir3: loft between two sections, ruled curve by curve
    recubrir3_from = [
        Edge.make_bspline([(-157.885934339, 81.5, 0.289527633), (-161.906879074, 81.5, 3.261396311), (-158.935010396, 81.5, 7.282341046), (-154.914065661, 81.5, 4.310472367), (-150.893120926, 81.5, 1.338603689), (-153.864989604, 81.5, -2.682341046), (-157.885934339, 81.5, 0.289527633)], [0, 0, 0, 0, 0.5, 0.5, 0.5, 1, 1, 1, 1], 3, [1, 0.333333333, 0.333333333, 1, 0.333333333, 0.333333333, 1]),
    ]
    recubrir3_to = [
        Edge.make_bspline([(-156.648689887, 85.5, 1.331416839), (-158.585856209, 85.5, 1.828796613), (-158.088476435, 85.5, 3.765962935), (-156.151310113, 85.5, 3.268583161), (-154.214143791, 85.5, 2.771203387), (-154.711523565, 85.5, 0.834037065), (-156.648689887, 85.5, 1.331416839)], [0, 0, 0, 0, 0.5, 0.5, 0.5, 1, 1, 1, 1], 3, [1, 0.333333333, 0.333333333, 1, 0.333333333, 0.333333333, 1]),
    ]
    recubrir3 = Solid(Shell([*[Face.make_surface_from_curves(recubrir3_from[k], recubrir3_to[k]) for k in range(1)], Face(Wire(recubrir3_from)), Face(Wire(recubrir3_to))]))
    add(recubrir3)


solid = part_1.part
